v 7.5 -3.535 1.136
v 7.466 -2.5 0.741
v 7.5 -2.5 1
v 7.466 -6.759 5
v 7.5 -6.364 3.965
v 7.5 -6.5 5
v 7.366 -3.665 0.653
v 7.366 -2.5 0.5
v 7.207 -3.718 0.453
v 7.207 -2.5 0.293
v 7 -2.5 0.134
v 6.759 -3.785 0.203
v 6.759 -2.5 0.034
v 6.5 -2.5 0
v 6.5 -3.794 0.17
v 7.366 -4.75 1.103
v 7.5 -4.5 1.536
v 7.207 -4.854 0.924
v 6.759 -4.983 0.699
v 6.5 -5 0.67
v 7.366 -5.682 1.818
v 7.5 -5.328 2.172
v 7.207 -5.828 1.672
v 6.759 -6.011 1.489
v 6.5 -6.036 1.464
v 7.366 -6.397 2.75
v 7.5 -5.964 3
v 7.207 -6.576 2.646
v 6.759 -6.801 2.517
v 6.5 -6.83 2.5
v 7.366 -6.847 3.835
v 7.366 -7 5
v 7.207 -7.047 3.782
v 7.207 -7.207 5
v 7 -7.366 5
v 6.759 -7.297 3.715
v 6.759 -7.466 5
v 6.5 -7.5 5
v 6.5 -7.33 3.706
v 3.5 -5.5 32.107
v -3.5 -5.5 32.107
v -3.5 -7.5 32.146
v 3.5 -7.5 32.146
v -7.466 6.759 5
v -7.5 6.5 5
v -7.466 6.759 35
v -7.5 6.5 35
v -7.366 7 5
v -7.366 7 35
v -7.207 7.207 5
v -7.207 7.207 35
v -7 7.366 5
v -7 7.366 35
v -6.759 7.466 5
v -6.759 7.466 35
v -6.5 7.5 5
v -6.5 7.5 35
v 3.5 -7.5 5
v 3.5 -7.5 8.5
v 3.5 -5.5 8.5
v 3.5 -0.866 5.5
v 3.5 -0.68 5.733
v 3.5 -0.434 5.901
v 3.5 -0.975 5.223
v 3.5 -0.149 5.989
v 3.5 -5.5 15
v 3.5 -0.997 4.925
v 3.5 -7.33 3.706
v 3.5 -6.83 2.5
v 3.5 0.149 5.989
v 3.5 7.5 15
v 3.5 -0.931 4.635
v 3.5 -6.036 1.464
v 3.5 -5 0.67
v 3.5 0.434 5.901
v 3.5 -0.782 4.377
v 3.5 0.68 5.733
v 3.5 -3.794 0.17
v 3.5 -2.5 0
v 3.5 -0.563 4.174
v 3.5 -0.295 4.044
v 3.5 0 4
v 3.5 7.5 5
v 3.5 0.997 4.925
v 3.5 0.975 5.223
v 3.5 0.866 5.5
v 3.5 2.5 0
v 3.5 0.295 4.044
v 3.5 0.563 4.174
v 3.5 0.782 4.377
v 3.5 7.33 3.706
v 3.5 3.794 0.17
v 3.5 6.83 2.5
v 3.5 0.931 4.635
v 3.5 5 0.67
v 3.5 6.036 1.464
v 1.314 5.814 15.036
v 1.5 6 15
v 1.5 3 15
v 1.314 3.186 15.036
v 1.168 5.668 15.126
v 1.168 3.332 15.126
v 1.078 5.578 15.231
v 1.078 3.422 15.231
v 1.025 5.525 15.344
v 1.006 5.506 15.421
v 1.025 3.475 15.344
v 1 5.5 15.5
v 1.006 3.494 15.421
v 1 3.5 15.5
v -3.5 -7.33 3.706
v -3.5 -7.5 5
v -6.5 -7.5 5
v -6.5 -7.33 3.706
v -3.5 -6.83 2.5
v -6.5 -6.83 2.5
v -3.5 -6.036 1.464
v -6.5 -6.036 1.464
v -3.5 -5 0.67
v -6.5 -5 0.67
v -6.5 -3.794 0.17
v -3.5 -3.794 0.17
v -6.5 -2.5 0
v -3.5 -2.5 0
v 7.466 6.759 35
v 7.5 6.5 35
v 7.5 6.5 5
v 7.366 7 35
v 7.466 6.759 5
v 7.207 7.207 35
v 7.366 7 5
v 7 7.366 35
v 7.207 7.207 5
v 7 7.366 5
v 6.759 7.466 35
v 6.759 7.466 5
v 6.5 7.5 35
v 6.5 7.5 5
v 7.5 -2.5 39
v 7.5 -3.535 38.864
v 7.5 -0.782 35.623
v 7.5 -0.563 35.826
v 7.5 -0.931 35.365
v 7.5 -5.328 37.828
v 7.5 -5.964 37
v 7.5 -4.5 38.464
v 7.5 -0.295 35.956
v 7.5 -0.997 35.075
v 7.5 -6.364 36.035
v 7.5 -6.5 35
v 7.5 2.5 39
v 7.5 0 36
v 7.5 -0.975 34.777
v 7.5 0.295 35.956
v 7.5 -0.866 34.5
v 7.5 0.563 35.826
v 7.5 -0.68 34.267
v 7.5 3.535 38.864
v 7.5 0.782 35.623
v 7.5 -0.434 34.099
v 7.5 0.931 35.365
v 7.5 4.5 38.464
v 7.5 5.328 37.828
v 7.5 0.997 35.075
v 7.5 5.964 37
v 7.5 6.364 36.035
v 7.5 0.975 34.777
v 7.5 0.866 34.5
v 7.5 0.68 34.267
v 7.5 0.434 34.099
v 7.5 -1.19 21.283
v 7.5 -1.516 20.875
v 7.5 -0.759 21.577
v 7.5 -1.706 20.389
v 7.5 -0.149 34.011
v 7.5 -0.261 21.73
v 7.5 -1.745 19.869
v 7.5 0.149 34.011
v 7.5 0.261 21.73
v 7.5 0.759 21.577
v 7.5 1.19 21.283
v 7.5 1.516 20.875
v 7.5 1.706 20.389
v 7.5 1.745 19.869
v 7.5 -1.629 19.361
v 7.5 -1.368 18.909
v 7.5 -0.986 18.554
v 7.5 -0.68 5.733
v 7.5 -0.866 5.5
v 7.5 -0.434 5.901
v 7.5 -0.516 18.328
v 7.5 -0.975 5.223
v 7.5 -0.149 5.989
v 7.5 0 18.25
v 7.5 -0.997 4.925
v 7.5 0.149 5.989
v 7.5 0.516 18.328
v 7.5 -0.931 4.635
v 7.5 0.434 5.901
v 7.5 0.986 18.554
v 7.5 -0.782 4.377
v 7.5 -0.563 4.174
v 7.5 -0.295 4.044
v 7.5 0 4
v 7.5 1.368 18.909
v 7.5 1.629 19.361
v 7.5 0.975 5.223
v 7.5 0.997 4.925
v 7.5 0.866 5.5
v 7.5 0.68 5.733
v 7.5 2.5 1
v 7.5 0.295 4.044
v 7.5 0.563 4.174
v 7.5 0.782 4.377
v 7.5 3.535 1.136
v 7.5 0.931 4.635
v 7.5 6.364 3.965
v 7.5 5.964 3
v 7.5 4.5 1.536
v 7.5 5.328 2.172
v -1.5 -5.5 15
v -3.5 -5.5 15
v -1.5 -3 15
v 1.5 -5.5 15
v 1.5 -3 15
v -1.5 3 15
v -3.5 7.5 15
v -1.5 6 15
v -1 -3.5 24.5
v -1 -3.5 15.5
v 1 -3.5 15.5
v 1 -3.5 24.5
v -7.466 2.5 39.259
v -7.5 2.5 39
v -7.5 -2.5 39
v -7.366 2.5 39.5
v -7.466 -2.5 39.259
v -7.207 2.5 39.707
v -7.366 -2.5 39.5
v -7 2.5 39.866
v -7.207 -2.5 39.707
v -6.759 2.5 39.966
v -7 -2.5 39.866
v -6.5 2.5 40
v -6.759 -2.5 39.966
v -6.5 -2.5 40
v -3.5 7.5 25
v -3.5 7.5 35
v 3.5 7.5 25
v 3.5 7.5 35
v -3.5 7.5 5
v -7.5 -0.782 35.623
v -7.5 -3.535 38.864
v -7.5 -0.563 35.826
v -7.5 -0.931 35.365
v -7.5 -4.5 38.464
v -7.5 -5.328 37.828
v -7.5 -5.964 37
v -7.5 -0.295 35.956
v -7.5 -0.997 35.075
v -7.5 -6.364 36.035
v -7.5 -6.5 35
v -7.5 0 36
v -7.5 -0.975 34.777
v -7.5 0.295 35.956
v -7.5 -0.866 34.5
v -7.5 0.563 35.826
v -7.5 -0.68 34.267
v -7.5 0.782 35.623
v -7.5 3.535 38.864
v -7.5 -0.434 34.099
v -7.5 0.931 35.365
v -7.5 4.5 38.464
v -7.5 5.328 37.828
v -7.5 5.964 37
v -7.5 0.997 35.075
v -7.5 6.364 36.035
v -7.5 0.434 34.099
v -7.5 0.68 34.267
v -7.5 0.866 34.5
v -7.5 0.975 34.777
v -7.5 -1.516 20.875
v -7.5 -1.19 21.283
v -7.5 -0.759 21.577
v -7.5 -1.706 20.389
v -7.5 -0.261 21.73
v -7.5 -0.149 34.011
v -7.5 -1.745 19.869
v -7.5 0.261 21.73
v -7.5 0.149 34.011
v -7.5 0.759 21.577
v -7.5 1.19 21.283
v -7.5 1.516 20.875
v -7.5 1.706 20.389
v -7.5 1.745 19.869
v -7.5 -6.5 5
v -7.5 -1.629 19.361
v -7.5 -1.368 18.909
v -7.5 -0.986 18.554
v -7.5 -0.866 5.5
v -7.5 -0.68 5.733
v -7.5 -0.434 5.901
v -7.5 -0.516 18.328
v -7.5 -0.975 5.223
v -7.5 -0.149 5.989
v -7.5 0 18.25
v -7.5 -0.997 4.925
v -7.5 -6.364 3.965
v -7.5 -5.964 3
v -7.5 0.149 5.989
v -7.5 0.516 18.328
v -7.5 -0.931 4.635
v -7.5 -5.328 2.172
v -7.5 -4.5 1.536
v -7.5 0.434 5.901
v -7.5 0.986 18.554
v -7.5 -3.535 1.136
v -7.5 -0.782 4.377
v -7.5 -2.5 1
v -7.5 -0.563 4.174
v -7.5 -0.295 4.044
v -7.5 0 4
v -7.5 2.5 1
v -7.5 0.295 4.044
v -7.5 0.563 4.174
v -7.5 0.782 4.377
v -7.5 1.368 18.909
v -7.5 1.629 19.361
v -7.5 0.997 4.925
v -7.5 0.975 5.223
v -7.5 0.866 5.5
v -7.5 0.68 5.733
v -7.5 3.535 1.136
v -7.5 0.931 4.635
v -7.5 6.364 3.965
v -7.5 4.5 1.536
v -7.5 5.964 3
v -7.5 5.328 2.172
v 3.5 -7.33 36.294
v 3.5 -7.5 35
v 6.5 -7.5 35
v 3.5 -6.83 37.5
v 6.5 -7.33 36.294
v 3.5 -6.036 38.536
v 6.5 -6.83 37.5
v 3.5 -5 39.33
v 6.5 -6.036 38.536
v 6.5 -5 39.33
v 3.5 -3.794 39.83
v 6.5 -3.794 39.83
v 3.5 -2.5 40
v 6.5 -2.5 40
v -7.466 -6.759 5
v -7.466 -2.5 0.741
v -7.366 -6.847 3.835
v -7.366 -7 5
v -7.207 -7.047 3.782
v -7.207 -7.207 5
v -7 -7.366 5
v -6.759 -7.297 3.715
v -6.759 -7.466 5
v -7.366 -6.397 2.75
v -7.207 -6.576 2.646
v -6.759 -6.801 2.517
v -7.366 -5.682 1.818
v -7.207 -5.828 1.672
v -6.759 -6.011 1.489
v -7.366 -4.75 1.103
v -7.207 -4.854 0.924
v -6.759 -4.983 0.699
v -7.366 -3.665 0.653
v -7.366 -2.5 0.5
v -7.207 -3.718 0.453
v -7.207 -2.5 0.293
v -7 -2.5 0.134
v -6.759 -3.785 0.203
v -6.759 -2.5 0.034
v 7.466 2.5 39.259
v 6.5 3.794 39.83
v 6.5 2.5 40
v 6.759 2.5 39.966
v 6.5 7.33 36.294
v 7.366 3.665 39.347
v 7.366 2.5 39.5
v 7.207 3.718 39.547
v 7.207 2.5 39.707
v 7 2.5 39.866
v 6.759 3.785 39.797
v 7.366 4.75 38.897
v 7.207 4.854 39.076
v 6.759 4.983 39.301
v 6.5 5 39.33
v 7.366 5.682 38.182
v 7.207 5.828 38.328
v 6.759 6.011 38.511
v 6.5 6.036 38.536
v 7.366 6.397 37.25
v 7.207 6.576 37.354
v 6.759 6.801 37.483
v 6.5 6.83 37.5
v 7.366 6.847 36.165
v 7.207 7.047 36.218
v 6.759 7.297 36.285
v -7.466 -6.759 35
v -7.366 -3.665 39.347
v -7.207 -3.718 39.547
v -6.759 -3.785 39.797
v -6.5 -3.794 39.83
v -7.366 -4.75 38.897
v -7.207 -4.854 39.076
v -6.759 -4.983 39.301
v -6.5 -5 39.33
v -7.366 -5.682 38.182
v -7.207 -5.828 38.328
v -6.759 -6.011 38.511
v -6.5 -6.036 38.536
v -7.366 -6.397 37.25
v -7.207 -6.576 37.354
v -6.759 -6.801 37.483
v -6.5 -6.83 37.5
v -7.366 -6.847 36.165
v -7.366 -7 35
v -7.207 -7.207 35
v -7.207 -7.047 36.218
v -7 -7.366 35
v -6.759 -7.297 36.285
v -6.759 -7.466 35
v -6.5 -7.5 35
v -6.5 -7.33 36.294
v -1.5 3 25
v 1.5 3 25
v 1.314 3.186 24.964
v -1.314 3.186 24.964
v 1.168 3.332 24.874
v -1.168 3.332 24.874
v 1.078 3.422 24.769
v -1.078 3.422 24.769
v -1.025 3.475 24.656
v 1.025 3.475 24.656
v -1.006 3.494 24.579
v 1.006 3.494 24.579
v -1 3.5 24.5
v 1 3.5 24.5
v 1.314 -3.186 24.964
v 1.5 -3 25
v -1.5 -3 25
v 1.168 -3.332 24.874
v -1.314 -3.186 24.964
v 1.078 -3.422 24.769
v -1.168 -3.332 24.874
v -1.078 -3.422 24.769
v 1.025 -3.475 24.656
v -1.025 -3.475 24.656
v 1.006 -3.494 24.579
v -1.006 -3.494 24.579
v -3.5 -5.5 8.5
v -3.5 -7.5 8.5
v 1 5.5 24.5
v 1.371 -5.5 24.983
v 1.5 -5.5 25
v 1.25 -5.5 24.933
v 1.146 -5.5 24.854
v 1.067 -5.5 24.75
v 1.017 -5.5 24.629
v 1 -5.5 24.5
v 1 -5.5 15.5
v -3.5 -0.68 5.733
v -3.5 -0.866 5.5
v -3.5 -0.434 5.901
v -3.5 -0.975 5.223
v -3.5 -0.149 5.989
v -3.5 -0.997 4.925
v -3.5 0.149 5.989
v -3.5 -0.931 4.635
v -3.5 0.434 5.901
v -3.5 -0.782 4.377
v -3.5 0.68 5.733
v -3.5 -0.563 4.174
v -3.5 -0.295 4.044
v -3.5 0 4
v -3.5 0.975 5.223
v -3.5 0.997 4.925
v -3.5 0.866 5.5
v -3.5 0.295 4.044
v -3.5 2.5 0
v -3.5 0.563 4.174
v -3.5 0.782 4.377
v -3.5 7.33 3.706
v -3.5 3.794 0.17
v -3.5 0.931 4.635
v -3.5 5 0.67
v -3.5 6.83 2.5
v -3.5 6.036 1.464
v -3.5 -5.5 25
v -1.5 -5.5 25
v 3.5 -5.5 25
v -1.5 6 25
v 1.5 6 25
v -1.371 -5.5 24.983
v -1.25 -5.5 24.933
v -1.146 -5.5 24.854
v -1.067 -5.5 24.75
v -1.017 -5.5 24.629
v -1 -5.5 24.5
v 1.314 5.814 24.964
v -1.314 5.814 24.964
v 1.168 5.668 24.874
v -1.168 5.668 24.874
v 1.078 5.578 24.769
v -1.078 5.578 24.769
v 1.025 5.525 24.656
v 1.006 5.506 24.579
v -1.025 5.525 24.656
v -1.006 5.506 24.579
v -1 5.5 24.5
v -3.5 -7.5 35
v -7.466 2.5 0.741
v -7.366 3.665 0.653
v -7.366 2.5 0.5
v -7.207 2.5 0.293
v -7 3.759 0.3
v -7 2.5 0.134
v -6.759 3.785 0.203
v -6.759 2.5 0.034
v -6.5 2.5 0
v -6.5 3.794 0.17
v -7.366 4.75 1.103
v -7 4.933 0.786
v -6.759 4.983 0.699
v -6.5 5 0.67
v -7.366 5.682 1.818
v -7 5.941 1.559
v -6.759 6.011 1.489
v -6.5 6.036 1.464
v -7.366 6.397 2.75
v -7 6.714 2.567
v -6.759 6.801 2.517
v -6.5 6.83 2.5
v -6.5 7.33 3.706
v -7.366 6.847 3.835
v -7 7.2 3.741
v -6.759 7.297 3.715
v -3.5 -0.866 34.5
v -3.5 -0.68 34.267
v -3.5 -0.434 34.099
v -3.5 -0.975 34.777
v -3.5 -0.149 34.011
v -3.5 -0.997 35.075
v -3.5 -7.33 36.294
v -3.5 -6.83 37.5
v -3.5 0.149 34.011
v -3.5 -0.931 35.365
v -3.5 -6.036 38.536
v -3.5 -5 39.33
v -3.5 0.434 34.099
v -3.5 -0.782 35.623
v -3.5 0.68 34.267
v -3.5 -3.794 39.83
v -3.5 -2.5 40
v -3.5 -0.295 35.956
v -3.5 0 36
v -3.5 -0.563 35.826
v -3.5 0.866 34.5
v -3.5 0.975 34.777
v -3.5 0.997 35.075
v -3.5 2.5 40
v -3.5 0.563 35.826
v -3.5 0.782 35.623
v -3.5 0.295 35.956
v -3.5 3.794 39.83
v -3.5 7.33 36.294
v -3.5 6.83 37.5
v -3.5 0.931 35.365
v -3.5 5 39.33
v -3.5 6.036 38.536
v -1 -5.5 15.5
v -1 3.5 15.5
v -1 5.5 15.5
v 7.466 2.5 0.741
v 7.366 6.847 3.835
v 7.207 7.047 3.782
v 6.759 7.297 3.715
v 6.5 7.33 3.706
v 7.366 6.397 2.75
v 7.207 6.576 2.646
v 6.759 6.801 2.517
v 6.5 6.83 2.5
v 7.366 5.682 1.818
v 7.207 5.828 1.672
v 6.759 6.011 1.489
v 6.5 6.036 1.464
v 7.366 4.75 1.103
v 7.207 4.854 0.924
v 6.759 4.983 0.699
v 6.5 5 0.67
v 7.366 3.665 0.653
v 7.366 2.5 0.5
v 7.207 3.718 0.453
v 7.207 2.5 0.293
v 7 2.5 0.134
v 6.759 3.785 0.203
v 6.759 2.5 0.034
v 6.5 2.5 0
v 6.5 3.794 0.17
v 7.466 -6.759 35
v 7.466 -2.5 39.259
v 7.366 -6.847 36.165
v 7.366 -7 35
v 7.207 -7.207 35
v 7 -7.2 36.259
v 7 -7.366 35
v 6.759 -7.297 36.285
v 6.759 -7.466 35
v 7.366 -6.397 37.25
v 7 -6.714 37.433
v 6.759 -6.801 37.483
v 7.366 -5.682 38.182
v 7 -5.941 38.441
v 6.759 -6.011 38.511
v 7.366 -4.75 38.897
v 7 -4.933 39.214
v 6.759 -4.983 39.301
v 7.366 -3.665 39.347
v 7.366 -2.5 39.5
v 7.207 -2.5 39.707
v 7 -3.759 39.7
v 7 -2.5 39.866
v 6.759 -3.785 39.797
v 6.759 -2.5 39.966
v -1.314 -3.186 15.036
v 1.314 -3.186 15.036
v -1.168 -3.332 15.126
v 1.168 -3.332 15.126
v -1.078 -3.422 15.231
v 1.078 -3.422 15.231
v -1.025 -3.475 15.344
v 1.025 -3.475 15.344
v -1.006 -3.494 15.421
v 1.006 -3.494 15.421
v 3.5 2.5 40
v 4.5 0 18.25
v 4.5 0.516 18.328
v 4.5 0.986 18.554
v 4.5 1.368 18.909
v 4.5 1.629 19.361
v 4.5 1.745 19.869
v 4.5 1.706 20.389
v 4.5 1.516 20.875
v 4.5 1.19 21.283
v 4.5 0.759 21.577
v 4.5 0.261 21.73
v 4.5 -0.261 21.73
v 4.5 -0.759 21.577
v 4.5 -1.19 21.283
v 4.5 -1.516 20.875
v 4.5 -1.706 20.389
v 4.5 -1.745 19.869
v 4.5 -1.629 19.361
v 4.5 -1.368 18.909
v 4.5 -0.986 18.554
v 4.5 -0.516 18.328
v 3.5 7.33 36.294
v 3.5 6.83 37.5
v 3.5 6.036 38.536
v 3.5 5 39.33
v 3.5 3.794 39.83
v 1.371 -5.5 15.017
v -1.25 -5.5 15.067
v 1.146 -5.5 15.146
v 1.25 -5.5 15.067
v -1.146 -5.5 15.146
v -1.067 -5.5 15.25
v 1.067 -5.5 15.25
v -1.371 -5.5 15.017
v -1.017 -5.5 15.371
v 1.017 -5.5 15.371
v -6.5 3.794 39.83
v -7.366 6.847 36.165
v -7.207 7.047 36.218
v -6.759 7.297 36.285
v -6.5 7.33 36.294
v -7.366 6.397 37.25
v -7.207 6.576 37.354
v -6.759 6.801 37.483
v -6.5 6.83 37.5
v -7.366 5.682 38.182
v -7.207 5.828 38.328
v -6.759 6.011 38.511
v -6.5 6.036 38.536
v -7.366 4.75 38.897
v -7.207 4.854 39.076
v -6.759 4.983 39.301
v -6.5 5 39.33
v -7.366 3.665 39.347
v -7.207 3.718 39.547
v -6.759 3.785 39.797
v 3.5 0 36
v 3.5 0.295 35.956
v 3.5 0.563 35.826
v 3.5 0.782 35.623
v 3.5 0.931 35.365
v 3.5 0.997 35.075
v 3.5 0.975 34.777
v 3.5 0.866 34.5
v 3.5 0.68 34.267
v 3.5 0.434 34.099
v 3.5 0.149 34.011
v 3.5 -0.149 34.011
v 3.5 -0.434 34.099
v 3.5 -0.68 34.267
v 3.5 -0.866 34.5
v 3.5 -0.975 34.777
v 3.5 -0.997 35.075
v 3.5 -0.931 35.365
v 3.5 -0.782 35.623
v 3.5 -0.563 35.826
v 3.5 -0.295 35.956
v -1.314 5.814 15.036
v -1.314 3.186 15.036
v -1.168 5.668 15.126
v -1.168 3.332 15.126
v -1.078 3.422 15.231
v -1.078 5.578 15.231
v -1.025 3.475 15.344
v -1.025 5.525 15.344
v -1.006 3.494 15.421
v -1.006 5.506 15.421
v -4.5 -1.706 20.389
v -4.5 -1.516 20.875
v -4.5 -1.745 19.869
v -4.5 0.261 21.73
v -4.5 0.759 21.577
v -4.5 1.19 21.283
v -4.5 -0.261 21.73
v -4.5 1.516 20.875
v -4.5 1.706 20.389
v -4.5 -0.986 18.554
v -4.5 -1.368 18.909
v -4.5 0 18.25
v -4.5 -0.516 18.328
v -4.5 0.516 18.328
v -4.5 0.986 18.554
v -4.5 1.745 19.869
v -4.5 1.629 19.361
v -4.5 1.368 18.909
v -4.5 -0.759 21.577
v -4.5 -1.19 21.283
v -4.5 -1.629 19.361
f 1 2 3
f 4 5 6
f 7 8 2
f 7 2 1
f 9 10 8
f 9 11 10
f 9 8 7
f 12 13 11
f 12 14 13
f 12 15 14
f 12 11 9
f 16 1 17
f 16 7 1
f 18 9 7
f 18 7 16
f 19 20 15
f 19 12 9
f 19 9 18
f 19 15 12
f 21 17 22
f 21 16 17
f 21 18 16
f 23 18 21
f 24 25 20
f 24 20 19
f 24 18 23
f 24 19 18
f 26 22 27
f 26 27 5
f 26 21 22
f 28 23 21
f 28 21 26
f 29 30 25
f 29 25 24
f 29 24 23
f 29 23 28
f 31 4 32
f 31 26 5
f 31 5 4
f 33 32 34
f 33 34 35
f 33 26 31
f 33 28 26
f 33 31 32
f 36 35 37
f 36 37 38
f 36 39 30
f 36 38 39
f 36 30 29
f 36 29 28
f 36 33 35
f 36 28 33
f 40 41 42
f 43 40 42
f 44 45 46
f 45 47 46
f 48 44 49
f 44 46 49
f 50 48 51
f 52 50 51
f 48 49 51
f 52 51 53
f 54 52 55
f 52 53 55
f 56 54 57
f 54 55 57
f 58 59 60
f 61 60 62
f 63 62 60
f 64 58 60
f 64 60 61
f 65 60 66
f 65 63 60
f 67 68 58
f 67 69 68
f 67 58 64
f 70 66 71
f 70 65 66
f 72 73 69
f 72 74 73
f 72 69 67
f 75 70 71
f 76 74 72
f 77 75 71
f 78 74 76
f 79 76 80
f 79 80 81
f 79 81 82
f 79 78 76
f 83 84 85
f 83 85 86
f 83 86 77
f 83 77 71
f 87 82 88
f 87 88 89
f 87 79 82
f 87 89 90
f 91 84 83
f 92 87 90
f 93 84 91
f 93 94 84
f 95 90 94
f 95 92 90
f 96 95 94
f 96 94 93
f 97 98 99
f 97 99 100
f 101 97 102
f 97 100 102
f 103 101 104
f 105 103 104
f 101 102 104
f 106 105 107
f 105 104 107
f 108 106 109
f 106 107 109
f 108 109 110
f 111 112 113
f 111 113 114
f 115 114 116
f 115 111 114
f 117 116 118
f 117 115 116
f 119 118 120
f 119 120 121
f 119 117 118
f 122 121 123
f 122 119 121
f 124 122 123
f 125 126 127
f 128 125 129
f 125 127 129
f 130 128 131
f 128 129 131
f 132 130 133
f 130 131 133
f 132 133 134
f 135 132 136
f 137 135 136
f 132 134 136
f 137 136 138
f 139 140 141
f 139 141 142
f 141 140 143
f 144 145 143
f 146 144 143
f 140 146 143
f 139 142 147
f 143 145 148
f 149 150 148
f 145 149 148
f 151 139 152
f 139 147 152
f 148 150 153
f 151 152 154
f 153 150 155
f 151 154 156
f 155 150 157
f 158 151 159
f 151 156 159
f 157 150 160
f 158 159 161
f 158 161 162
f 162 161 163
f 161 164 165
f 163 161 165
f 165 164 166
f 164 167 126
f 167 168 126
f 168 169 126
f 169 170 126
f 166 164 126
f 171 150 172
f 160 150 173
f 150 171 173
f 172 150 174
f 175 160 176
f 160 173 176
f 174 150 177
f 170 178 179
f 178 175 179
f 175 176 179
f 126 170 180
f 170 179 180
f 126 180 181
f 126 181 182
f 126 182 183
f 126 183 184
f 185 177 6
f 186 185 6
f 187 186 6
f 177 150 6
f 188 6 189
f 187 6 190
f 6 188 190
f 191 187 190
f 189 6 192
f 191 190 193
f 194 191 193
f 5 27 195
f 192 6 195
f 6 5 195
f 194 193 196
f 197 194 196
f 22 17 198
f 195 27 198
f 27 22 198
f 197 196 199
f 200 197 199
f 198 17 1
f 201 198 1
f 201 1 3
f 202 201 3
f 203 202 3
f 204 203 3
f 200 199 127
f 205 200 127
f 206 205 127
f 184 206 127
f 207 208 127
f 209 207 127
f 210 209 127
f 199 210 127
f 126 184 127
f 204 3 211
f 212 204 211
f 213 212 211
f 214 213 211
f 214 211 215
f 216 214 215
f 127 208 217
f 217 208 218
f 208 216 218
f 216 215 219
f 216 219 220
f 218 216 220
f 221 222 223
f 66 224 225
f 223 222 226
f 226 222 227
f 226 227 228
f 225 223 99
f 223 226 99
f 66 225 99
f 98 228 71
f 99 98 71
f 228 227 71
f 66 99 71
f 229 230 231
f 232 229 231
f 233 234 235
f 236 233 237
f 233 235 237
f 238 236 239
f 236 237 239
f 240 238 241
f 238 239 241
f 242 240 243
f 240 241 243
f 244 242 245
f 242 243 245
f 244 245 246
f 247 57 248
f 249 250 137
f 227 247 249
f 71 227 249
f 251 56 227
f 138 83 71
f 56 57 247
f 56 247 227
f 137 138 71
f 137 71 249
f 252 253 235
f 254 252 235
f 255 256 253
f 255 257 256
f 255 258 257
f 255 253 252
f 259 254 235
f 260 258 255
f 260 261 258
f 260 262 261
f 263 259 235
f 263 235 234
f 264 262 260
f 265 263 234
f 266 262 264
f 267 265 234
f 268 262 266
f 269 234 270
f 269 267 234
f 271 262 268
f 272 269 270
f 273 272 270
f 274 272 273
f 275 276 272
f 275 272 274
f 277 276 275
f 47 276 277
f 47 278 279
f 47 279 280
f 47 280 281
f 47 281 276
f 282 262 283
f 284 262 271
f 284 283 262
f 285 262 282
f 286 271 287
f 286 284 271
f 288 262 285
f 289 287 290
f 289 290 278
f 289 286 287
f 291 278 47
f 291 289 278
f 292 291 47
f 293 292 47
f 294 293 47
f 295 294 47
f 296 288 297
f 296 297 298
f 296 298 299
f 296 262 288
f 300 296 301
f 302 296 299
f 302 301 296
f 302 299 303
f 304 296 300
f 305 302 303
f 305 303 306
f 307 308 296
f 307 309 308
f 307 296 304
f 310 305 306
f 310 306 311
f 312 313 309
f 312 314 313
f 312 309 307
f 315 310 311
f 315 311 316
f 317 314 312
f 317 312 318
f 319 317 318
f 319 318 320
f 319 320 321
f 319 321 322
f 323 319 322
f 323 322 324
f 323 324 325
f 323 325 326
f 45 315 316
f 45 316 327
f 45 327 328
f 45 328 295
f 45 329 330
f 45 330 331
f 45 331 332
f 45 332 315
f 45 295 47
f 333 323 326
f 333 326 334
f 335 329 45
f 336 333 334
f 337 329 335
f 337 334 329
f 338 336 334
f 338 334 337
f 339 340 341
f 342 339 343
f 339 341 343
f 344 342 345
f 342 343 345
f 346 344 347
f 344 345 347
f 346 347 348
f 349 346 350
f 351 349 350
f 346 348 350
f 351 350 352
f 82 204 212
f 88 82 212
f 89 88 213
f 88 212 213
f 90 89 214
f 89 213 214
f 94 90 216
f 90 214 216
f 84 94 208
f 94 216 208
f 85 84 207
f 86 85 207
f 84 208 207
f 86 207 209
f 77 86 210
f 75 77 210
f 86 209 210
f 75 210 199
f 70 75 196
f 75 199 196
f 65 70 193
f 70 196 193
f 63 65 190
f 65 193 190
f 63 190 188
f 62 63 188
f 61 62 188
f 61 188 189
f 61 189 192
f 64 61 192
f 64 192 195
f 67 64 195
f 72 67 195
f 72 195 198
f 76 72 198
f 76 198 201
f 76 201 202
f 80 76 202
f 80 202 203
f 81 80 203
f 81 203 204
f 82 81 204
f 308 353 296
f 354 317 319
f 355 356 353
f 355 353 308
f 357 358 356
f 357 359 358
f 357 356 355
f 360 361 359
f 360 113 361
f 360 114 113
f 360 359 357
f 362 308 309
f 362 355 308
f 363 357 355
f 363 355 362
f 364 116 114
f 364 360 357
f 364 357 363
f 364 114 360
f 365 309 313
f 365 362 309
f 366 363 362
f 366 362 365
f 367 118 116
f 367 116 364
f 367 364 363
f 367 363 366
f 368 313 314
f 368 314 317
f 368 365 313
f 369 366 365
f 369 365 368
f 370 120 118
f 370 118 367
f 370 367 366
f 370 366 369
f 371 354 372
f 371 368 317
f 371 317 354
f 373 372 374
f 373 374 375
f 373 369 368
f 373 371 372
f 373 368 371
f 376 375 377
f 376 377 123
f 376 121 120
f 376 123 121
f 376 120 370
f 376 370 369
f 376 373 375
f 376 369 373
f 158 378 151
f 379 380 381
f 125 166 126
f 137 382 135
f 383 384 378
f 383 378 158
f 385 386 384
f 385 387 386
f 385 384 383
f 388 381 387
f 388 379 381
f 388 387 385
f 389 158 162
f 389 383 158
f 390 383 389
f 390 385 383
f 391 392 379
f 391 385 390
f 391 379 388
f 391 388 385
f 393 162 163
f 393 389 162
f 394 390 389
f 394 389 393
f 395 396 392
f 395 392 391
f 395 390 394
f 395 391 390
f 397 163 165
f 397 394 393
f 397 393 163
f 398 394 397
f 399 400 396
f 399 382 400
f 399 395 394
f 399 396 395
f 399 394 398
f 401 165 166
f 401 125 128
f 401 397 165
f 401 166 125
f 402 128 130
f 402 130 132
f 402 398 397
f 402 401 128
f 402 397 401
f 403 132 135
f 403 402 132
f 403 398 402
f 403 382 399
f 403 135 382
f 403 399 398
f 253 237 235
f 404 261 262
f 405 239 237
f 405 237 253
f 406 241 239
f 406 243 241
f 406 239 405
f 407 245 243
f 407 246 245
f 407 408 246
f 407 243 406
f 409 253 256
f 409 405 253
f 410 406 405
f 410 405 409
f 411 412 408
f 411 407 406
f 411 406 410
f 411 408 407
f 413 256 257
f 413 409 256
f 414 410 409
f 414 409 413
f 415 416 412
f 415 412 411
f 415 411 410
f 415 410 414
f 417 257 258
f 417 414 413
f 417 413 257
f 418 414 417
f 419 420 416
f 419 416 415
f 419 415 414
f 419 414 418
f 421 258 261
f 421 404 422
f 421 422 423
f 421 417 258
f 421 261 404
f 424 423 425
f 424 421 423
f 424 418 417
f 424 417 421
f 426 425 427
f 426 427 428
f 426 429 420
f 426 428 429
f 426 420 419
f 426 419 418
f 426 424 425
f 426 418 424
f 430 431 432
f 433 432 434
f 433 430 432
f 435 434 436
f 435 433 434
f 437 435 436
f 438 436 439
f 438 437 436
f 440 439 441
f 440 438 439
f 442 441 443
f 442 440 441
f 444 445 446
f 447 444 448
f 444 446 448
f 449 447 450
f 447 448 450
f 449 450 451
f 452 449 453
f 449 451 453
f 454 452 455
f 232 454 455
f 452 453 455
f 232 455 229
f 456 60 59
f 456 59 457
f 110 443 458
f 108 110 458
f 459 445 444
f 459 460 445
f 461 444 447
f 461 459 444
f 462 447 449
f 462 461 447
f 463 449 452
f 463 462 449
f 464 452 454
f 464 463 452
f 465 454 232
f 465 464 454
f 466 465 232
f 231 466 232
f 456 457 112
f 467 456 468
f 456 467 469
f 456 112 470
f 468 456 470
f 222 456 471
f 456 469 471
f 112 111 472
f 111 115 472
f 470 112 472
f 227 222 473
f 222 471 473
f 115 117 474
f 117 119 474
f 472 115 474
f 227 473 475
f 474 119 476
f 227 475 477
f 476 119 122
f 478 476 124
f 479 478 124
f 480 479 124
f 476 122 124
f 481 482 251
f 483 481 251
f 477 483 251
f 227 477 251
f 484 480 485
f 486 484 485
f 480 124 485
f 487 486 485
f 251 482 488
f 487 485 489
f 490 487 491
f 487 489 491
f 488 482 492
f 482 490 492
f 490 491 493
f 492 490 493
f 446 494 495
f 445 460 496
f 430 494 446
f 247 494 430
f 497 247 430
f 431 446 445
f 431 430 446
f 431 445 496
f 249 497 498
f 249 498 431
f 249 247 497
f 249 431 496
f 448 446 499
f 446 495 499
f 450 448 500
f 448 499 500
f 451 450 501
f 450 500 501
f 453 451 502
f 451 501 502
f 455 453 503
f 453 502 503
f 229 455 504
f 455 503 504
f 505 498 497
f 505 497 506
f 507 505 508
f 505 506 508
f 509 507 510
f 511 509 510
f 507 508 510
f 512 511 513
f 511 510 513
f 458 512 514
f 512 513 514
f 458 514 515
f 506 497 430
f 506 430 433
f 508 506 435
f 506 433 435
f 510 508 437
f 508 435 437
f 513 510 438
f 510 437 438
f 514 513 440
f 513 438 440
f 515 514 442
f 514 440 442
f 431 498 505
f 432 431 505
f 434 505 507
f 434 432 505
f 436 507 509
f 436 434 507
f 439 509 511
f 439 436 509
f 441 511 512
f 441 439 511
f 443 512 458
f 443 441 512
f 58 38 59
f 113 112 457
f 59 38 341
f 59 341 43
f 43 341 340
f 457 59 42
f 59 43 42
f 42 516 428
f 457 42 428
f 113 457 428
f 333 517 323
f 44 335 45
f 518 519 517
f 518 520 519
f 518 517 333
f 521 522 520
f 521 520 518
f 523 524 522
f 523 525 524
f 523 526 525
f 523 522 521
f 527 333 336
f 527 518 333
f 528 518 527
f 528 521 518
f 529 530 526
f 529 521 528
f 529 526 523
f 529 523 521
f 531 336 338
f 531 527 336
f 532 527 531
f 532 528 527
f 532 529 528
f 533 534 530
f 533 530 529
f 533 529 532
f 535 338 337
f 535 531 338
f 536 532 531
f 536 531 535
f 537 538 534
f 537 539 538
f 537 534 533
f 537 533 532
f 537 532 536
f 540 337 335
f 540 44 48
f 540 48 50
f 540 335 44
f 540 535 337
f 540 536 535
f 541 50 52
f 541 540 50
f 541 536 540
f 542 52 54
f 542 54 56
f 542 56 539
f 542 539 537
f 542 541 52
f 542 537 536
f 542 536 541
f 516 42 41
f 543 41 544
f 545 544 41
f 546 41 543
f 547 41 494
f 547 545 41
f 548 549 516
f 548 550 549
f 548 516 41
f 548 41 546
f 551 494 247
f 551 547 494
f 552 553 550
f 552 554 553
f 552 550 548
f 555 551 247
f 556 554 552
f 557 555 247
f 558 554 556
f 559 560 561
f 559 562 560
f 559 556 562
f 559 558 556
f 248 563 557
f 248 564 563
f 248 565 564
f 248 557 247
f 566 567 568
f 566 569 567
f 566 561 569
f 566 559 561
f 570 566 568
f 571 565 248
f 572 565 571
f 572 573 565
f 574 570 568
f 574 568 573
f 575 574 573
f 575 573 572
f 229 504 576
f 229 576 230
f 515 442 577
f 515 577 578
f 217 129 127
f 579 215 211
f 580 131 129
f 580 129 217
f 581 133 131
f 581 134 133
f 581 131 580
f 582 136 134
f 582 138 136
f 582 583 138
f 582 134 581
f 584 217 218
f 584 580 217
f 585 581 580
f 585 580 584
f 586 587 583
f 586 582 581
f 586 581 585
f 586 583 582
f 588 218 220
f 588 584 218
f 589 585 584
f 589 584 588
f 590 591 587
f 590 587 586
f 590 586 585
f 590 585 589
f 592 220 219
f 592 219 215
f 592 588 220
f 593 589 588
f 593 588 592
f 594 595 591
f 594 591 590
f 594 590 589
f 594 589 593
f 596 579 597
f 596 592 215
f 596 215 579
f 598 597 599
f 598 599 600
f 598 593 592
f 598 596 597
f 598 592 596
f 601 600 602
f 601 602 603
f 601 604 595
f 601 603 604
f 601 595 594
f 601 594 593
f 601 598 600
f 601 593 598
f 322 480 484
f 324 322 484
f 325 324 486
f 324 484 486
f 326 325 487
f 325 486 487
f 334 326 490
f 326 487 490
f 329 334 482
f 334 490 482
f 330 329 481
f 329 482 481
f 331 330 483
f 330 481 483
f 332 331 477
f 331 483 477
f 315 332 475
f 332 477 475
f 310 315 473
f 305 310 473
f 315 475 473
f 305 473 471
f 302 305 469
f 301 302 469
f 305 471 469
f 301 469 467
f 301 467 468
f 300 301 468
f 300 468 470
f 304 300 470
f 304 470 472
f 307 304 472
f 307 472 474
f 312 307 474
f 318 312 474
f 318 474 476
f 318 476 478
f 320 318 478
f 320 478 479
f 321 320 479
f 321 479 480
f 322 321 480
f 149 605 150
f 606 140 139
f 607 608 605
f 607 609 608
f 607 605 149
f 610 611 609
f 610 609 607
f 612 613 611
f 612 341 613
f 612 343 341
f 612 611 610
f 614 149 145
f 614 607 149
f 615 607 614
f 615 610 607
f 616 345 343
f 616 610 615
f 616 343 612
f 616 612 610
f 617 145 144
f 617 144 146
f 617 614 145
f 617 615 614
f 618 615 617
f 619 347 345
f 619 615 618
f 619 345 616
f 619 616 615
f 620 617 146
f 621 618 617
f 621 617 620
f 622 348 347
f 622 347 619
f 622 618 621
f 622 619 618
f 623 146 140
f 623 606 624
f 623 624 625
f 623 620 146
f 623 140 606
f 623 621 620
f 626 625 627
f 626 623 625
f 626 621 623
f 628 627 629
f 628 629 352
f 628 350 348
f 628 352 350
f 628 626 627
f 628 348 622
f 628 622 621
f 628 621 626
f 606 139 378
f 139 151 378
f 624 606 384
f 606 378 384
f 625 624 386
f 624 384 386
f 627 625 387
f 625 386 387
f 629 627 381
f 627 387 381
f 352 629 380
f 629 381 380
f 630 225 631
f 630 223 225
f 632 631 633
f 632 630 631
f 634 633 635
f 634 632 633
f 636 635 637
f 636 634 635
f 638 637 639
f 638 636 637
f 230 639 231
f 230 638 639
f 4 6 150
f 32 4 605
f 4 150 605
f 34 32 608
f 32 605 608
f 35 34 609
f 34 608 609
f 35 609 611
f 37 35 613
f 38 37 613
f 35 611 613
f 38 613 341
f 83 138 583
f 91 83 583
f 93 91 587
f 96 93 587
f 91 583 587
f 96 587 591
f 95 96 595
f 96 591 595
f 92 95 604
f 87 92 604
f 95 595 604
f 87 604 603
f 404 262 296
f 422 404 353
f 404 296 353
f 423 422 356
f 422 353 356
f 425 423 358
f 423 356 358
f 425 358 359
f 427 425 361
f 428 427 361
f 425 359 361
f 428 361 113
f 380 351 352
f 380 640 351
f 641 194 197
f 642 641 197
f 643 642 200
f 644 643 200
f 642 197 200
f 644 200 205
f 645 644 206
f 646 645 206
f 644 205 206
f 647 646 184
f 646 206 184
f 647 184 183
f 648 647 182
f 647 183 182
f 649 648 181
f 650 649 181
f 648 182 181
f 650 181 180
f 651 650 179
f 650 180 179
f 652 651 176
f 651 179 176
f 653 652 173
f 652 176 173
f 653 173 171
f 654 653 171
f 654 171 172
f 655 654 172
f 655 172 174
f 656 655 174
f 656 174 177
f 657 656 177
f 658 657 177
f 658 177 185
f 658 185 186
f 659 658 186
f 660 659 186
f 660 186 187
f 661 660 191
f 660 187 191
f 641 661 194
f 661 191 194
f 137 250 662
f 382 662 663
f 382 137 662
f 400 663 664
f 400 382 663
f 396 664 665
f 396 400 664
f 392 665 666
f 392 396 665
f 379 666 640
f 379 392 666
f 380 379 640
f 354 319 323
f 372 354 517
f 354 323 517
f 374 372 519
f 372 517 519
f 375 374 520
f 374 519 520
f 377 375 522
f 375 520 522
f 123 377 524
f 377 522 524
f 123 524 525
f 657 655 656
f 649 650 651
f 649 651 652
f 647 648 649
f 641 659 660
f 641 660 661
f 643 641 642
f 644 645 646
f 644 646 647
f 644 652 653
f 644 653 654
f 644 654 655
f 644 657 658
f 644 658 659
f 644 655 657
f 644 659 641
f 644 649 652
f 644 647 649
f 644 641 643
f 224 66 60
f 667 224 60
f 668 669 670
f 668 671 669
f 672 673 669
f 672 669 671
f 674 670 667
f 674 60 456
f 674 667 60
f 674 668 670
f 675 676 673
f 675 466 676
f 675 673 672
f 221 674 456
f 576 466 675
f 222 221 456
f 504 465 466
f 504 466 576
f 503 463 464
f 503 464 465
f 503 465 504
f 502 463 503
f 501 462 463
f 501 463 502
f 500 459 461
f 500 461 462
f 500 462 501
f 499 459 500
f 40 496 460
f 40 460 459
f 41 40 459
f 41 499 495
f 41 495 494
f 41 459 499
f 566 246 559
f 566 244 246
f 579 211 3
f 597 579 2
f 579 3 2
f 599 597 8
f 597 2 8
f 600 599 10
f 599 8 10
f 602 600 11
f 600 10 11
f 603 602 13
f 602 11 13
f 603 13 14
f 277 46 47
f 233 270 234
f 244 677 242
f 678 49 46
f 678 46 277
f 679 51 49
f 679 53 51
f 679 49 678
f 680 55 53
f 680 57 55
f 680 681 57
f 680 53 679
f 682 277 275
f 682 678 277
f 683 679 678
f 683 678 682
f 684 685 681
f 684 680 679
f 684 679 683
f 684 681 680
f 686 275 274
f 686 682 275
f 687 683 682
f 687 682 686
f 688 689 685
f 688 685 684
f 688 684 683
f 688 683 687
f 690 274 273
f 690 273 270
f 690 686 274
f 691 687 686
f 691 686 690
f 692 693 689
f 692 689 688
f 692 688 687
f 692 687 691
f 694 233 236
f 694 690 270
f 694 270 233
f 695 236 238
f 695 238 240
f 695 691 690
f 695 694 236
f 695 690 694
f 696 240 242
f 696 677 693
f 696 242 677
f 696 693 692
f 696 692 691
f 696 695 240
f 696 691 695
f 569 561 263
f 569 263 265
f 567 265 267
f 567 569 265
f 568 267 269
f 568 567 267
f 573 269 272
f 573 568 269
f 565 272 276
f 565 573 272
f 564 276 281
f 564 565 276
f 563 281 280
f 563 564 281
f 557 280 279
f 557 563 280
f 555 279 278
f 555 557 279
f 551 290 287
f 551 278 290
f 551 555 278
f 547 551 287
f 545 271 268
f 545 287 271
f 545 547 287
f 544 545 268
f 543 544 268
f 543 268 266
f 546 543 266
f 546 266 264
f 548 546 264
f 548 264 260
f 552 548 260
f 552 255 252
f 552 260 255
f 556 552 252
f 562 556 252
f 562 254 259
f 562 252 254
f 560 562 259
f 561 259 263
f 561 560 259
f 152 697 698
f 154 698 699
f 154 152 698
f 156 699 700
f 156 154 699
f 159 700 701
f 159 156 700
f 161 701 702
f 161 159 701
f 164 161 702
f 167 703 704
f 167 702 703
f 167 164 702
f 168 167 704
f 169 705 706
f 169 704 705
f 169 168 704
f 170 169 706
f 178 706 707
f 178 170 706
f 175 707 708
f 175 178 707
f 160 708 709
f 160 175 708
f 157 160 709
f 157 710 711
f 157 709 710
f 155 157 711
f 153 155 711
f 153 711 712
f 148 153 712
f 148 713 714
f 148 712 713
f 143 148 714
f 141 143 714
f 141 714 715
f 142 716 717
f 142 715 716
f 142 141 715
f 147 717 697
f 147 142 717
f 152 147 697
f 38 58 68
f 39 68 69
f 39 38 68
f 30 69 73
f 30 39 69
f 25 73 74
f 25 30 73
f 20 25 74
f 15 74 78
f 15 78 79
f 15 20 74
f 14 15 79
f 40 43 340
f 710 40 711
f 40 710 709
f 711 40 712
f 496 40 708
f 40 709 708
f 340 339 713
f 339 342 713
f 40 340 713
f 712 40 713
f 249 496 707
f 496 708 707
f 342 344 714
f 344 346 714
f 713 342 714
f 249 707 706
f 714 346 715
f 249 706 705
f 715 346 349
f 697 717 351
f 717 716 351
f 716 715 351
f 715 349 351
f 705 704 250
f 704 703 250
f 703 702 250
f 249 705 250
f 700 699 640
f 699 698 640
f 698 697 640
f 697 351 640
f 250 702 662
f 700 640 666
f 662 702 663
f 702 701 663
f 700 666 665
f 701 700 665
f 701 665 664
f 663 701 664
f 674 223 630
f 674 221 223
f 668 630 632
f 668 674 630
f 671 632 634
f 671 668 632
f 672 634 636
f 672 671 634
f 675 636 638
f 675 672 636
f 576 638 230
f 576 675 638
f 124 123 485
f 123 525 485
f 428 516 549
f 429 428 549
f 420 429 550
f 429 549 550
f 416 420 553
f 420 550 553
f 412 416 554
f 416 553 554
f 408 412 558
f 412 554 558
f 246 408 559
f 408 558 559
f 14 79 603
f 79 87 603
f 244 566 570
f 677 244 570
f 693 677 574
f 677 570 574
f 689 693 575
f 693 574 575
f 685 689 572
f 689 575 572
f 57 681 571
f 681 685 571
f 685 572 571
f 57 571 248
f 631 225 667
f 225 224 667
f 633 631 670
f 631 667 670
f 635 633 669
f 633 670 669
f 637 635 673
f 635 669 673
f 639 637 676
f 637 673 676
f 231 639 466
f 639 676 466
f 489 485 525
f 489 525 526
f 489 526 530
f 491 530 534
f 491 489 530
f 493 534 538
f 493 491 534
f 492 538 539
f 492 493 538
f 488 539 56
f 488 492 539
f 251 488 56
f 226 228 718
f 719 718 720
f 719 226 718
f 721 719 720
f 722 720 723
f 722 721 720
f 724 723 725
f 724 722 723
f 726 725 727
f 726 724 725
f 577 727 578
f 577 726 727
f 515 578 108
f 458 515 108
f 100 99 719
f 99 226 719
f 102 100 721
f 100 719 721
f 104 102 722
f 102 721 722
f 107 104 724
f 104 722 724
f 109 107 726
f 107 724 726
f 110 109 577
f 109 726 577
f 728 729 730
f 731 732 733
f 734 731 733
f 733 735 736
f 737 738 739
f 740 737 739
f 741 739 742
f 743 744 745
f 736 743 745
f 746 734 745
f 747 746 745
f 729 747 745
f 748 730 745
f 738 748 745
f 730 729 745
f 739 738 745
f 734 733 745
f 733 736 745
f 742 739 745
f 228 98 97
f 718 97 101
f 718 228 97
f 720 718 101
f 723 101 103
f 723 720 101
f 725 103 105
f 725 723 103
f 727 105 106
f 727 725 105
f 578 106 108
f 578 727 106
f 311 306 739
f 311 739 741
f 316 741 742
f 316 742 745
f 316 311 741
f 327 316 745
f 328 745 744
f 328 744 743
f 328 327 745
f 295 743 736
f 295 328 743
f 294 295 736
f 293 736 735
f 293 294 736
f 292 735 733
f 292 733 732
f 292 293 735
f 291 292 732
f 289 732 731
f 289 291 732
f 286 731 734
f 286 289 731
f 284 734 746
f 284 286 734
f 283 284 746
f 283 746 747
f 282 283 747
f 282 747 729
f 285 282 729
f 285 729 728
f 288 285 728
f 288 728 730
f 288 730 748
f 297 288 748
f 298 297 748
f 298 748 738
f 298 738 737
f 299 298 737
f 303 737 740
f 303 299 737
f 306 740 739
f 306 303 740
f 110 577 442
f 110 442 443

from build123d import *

# Parameters (mm, degrees)
BOTTOM_SECTION_BASE_SKETCH_W             = 15
BOTTOM_SECTION_BASE_SKETCH_H             = 15
BOTTOM_SECTION_EXTRUDE_DEPTH             = 40
HINGE_CUTOUT_SKETCH_W                    = 7
HINGE_CUTOUT_SKETCH_H                    = 15
HINGE_CUTOUT_EXTRUDED_CUT_DEPTH          = 15
HINGE_HOLE_SKETCH_R                      = 1
HINGE_HOLE_EXTRUDED_CUT_DEPTH            = 44.373378932
HINGER_CORNER_FILLETS_R                  = 5
STYLE_FILLETS_R                          = 1
ROUTING_HOLES_SKETCH_W                   = 2
ROUTING_HOLES_SKETCH_H                   = 2
ROUTING_HOLES_EXTRUDED_CUT_DEPTH         = 42.382363393
BACKING_START                            = -3.5
BACKING_EXTRUDE_DEPTH                    = 7
BOTTOM_SECTION_CONNECTION_HOLE_R         = 1.75
BOTTOM_SECTION_CONNECTION_HOLE_CUT_DEPTH = 3
SKETCH2_W                                = 7
SKETCH2_H                                = 2
BOTTOM_EXTENSION_EXTRUDE_DEPTH           = 6.5
FILLET1_R                                = 0.5


# Read off the part's stored shape, not the designer's step: Backing Extrude
with BuildPart() as part:
    # Bottom Section Base Sketch → Bottom Section Extrude (new body)
    with BuildSketch(Plane.XY):
        Rectangle(BOTTOM_SECTION_BASE_SKETCH_W, BOTTOM_SECTION_BASE_SKETCH_H)
    extrude(amount=BOTTOM_SECTION_EXTRUDE_DEPTH)

    # Hinge Cutout Sketch → Hinge Cutout Extruded Cut (cut)
    with BuildSketch(Plane.XY):
        Rectangle(HINGE_CUTOUT_SKETCH_W, HINGE_CUTOUT_SKETCH_H)
    hinge_cutout_extruded_cut = extrude(amount=HINGE_CUTOUT_EXTRUDED_CUT_DEPTH, mode=Mode.SUBTRACT)

    # Hinge Hole Sketch → Hinge Hole Extruded Cut (cut, through all)
    with BuildSketch(Plane(origin=(7.5, 0, 0), x_dir=(0, 0, -1), z_dir=(1, 0, 0))):
        with Locations((-5, 0)):
            Circle(HINGE_HOLE_SKETCH_R)
    hinge_hole_extruded_cut = extrude(amount=-HINGE_HOLE_EXTRUDED_CUT_DEPTH, mode=Mode.SUBTRACT)

    # Hinge and Hole Cutout Mirror: Hinge Cutout Extruded Cut, Hinge Hole Extruded Cut across plane
    add(hinge_cutout_extruded_cut.mirror(Plane.XY.offset(20)), mode=Mode.SUBTRACT)
    add(hinge_hole_extruded_cut.mirror(Plane.XY.offset(20)), mode=Mode.SUBTRACT)

    # Hinger Corner Fillets
    hinger_corner_fillets_edges = [part.edges().sort_by_distance(p)[0] for p in [
        (5.5, -7.5, 0),
        (-5.5, 7.5, 0),
        (-5.5, -7.5, 40),
        (-5.5, 7.5, 40),
        (5.5, -7.5, 40),
        (-5.5, -7.5, 0),
        (5.5, 7.5, 0),
        (5.5, 7.5, 40),
    ]]
    fillet(hinger_corner_fillets_edges, radius=HINGER_CORNER_FILLETS_R)

    # Style Fillets
    style_fillets_edges = [part.edges().sort_by_distance(p)[0] for p in [
        (7.5, 0, 40),
        (7.5, 7.5, 20),
        (-7.5, 7.5, 20),
        (7.5, 0, 0),
        (7.5, -7.5, 20),
        (7.5, 6.035533906, 1.464466094),
        (7.5, -6.035533906, 1.464466094),
        (7.5, -6.035533906, 38.535533906),
        (7.5, 6.035533906, 38.535533906),
        (-7.5, -7.5, 20),
        (-7.5, 0, 40),
        (-7.5, 0, 0),
        (-7.5, -6.035533906, 1.464466094),
        (-7.5, 6.035533906, 1.464466094),
        (-7.5, 6.035533906, 38.535533906),
        (-7.5, -6.035533906, 38.535533906),
    ]]
    fillet(style_fillets_edges, radius=STYLE_FILLETS_R)

    # Routing Holes Sketch → Routing Holes Extruded Cut (cut, through all)
    with BuildSketch(Plane.XY):
        with Locations((0, 4.5)):
            Rectangle(ROUTING_HOLES_SKETCH_W, ROUTING_HOLES_SKETCH_H)
        with Locations((0, -4.5)):
            Rectangle(ROUTING_HOLES_SKETCH_W, ROUTING_HOLES_SKETCH_H)
    extrude(amount=ROUTING_HOLES_EXTRUDED_CUT_DEPTH, mode=Mode.SUBTRACT)

    # Backing Extrude outline → Backing Extrude (add)
    with BuildSketch(Plane.YZ.offset(BACKING_START)):
        Polygon((-7.5, 32.145884327), (-7.5, 25), (-5.5, 25), (-5.5, 32.106829325), align=None)
    extrude(amount=BACKING_EXTRUDE_DEPTH)

    # Bottom Section Connection Hole → Bottom Section Connection Hole Cut (cut)
    with BuildSketch(Plane(origin=(7.5, 0, 0), x_dir=(0, 0, -1), z_dir=(1, 0, 0))):
        with Locations((-20, 0)):
            Circle(BOTTOM_SECTION_CONNECTION_HOLE_R)
    bottom_section_connection_hole_cut = extrude(amount=-BOTTOM_SECTION_CONNECTION_HOLE_CUT_DEPTH, mode=Mode.SUBTRACT)

    # Sketch2 → Bottom extension Extrude (add)
    with BuildSketch(Plane(origin=(0, 0, 15), x_dir=(-1, 0, 0), z_dir=(0, 0, -1))):
        with Locations((0, -6.5)):
            Rectangle(SKETCH2_W, SKETCH2_H)
    extrude(amount=BOTTOM_EXTENSION_EXTRUDE_DEPTH)

    # Connection Hole Mirror: Bottom Section Connection Hole Cut across plane
    add(bottom_section_connection_hole_cut.mirror(Plane(origin=(0, 0, 0), x_dir=(0, 0, 1), z_dir=(1, 0, 0))), mode=Mode.SUBTRACT)

    # Fillet1
    fillet1_edges = [part.edges().sort_by_distance(p)[0] for p in [
        (-1, -4.5, 25),
        (0, -3.5, 25),
        (1, -4.5, 25),
        (0, 5.5, 25),
        (1, 4.5, 25),
        (0, 3.5, 25),
        (-1, 4.5, 25),
        (-1, 4.5, 15),
        (0, 3.5, 15),
        (1, 4.5, 15),
        (0, 5.5, 15),
        (1, -4.5, 15),
        (0, -3.5, 15),
        (-1, -4.5, 15),
    ]]
    fillet(fillet1_edges, radius=FILLET1_R)


solid = part.part
